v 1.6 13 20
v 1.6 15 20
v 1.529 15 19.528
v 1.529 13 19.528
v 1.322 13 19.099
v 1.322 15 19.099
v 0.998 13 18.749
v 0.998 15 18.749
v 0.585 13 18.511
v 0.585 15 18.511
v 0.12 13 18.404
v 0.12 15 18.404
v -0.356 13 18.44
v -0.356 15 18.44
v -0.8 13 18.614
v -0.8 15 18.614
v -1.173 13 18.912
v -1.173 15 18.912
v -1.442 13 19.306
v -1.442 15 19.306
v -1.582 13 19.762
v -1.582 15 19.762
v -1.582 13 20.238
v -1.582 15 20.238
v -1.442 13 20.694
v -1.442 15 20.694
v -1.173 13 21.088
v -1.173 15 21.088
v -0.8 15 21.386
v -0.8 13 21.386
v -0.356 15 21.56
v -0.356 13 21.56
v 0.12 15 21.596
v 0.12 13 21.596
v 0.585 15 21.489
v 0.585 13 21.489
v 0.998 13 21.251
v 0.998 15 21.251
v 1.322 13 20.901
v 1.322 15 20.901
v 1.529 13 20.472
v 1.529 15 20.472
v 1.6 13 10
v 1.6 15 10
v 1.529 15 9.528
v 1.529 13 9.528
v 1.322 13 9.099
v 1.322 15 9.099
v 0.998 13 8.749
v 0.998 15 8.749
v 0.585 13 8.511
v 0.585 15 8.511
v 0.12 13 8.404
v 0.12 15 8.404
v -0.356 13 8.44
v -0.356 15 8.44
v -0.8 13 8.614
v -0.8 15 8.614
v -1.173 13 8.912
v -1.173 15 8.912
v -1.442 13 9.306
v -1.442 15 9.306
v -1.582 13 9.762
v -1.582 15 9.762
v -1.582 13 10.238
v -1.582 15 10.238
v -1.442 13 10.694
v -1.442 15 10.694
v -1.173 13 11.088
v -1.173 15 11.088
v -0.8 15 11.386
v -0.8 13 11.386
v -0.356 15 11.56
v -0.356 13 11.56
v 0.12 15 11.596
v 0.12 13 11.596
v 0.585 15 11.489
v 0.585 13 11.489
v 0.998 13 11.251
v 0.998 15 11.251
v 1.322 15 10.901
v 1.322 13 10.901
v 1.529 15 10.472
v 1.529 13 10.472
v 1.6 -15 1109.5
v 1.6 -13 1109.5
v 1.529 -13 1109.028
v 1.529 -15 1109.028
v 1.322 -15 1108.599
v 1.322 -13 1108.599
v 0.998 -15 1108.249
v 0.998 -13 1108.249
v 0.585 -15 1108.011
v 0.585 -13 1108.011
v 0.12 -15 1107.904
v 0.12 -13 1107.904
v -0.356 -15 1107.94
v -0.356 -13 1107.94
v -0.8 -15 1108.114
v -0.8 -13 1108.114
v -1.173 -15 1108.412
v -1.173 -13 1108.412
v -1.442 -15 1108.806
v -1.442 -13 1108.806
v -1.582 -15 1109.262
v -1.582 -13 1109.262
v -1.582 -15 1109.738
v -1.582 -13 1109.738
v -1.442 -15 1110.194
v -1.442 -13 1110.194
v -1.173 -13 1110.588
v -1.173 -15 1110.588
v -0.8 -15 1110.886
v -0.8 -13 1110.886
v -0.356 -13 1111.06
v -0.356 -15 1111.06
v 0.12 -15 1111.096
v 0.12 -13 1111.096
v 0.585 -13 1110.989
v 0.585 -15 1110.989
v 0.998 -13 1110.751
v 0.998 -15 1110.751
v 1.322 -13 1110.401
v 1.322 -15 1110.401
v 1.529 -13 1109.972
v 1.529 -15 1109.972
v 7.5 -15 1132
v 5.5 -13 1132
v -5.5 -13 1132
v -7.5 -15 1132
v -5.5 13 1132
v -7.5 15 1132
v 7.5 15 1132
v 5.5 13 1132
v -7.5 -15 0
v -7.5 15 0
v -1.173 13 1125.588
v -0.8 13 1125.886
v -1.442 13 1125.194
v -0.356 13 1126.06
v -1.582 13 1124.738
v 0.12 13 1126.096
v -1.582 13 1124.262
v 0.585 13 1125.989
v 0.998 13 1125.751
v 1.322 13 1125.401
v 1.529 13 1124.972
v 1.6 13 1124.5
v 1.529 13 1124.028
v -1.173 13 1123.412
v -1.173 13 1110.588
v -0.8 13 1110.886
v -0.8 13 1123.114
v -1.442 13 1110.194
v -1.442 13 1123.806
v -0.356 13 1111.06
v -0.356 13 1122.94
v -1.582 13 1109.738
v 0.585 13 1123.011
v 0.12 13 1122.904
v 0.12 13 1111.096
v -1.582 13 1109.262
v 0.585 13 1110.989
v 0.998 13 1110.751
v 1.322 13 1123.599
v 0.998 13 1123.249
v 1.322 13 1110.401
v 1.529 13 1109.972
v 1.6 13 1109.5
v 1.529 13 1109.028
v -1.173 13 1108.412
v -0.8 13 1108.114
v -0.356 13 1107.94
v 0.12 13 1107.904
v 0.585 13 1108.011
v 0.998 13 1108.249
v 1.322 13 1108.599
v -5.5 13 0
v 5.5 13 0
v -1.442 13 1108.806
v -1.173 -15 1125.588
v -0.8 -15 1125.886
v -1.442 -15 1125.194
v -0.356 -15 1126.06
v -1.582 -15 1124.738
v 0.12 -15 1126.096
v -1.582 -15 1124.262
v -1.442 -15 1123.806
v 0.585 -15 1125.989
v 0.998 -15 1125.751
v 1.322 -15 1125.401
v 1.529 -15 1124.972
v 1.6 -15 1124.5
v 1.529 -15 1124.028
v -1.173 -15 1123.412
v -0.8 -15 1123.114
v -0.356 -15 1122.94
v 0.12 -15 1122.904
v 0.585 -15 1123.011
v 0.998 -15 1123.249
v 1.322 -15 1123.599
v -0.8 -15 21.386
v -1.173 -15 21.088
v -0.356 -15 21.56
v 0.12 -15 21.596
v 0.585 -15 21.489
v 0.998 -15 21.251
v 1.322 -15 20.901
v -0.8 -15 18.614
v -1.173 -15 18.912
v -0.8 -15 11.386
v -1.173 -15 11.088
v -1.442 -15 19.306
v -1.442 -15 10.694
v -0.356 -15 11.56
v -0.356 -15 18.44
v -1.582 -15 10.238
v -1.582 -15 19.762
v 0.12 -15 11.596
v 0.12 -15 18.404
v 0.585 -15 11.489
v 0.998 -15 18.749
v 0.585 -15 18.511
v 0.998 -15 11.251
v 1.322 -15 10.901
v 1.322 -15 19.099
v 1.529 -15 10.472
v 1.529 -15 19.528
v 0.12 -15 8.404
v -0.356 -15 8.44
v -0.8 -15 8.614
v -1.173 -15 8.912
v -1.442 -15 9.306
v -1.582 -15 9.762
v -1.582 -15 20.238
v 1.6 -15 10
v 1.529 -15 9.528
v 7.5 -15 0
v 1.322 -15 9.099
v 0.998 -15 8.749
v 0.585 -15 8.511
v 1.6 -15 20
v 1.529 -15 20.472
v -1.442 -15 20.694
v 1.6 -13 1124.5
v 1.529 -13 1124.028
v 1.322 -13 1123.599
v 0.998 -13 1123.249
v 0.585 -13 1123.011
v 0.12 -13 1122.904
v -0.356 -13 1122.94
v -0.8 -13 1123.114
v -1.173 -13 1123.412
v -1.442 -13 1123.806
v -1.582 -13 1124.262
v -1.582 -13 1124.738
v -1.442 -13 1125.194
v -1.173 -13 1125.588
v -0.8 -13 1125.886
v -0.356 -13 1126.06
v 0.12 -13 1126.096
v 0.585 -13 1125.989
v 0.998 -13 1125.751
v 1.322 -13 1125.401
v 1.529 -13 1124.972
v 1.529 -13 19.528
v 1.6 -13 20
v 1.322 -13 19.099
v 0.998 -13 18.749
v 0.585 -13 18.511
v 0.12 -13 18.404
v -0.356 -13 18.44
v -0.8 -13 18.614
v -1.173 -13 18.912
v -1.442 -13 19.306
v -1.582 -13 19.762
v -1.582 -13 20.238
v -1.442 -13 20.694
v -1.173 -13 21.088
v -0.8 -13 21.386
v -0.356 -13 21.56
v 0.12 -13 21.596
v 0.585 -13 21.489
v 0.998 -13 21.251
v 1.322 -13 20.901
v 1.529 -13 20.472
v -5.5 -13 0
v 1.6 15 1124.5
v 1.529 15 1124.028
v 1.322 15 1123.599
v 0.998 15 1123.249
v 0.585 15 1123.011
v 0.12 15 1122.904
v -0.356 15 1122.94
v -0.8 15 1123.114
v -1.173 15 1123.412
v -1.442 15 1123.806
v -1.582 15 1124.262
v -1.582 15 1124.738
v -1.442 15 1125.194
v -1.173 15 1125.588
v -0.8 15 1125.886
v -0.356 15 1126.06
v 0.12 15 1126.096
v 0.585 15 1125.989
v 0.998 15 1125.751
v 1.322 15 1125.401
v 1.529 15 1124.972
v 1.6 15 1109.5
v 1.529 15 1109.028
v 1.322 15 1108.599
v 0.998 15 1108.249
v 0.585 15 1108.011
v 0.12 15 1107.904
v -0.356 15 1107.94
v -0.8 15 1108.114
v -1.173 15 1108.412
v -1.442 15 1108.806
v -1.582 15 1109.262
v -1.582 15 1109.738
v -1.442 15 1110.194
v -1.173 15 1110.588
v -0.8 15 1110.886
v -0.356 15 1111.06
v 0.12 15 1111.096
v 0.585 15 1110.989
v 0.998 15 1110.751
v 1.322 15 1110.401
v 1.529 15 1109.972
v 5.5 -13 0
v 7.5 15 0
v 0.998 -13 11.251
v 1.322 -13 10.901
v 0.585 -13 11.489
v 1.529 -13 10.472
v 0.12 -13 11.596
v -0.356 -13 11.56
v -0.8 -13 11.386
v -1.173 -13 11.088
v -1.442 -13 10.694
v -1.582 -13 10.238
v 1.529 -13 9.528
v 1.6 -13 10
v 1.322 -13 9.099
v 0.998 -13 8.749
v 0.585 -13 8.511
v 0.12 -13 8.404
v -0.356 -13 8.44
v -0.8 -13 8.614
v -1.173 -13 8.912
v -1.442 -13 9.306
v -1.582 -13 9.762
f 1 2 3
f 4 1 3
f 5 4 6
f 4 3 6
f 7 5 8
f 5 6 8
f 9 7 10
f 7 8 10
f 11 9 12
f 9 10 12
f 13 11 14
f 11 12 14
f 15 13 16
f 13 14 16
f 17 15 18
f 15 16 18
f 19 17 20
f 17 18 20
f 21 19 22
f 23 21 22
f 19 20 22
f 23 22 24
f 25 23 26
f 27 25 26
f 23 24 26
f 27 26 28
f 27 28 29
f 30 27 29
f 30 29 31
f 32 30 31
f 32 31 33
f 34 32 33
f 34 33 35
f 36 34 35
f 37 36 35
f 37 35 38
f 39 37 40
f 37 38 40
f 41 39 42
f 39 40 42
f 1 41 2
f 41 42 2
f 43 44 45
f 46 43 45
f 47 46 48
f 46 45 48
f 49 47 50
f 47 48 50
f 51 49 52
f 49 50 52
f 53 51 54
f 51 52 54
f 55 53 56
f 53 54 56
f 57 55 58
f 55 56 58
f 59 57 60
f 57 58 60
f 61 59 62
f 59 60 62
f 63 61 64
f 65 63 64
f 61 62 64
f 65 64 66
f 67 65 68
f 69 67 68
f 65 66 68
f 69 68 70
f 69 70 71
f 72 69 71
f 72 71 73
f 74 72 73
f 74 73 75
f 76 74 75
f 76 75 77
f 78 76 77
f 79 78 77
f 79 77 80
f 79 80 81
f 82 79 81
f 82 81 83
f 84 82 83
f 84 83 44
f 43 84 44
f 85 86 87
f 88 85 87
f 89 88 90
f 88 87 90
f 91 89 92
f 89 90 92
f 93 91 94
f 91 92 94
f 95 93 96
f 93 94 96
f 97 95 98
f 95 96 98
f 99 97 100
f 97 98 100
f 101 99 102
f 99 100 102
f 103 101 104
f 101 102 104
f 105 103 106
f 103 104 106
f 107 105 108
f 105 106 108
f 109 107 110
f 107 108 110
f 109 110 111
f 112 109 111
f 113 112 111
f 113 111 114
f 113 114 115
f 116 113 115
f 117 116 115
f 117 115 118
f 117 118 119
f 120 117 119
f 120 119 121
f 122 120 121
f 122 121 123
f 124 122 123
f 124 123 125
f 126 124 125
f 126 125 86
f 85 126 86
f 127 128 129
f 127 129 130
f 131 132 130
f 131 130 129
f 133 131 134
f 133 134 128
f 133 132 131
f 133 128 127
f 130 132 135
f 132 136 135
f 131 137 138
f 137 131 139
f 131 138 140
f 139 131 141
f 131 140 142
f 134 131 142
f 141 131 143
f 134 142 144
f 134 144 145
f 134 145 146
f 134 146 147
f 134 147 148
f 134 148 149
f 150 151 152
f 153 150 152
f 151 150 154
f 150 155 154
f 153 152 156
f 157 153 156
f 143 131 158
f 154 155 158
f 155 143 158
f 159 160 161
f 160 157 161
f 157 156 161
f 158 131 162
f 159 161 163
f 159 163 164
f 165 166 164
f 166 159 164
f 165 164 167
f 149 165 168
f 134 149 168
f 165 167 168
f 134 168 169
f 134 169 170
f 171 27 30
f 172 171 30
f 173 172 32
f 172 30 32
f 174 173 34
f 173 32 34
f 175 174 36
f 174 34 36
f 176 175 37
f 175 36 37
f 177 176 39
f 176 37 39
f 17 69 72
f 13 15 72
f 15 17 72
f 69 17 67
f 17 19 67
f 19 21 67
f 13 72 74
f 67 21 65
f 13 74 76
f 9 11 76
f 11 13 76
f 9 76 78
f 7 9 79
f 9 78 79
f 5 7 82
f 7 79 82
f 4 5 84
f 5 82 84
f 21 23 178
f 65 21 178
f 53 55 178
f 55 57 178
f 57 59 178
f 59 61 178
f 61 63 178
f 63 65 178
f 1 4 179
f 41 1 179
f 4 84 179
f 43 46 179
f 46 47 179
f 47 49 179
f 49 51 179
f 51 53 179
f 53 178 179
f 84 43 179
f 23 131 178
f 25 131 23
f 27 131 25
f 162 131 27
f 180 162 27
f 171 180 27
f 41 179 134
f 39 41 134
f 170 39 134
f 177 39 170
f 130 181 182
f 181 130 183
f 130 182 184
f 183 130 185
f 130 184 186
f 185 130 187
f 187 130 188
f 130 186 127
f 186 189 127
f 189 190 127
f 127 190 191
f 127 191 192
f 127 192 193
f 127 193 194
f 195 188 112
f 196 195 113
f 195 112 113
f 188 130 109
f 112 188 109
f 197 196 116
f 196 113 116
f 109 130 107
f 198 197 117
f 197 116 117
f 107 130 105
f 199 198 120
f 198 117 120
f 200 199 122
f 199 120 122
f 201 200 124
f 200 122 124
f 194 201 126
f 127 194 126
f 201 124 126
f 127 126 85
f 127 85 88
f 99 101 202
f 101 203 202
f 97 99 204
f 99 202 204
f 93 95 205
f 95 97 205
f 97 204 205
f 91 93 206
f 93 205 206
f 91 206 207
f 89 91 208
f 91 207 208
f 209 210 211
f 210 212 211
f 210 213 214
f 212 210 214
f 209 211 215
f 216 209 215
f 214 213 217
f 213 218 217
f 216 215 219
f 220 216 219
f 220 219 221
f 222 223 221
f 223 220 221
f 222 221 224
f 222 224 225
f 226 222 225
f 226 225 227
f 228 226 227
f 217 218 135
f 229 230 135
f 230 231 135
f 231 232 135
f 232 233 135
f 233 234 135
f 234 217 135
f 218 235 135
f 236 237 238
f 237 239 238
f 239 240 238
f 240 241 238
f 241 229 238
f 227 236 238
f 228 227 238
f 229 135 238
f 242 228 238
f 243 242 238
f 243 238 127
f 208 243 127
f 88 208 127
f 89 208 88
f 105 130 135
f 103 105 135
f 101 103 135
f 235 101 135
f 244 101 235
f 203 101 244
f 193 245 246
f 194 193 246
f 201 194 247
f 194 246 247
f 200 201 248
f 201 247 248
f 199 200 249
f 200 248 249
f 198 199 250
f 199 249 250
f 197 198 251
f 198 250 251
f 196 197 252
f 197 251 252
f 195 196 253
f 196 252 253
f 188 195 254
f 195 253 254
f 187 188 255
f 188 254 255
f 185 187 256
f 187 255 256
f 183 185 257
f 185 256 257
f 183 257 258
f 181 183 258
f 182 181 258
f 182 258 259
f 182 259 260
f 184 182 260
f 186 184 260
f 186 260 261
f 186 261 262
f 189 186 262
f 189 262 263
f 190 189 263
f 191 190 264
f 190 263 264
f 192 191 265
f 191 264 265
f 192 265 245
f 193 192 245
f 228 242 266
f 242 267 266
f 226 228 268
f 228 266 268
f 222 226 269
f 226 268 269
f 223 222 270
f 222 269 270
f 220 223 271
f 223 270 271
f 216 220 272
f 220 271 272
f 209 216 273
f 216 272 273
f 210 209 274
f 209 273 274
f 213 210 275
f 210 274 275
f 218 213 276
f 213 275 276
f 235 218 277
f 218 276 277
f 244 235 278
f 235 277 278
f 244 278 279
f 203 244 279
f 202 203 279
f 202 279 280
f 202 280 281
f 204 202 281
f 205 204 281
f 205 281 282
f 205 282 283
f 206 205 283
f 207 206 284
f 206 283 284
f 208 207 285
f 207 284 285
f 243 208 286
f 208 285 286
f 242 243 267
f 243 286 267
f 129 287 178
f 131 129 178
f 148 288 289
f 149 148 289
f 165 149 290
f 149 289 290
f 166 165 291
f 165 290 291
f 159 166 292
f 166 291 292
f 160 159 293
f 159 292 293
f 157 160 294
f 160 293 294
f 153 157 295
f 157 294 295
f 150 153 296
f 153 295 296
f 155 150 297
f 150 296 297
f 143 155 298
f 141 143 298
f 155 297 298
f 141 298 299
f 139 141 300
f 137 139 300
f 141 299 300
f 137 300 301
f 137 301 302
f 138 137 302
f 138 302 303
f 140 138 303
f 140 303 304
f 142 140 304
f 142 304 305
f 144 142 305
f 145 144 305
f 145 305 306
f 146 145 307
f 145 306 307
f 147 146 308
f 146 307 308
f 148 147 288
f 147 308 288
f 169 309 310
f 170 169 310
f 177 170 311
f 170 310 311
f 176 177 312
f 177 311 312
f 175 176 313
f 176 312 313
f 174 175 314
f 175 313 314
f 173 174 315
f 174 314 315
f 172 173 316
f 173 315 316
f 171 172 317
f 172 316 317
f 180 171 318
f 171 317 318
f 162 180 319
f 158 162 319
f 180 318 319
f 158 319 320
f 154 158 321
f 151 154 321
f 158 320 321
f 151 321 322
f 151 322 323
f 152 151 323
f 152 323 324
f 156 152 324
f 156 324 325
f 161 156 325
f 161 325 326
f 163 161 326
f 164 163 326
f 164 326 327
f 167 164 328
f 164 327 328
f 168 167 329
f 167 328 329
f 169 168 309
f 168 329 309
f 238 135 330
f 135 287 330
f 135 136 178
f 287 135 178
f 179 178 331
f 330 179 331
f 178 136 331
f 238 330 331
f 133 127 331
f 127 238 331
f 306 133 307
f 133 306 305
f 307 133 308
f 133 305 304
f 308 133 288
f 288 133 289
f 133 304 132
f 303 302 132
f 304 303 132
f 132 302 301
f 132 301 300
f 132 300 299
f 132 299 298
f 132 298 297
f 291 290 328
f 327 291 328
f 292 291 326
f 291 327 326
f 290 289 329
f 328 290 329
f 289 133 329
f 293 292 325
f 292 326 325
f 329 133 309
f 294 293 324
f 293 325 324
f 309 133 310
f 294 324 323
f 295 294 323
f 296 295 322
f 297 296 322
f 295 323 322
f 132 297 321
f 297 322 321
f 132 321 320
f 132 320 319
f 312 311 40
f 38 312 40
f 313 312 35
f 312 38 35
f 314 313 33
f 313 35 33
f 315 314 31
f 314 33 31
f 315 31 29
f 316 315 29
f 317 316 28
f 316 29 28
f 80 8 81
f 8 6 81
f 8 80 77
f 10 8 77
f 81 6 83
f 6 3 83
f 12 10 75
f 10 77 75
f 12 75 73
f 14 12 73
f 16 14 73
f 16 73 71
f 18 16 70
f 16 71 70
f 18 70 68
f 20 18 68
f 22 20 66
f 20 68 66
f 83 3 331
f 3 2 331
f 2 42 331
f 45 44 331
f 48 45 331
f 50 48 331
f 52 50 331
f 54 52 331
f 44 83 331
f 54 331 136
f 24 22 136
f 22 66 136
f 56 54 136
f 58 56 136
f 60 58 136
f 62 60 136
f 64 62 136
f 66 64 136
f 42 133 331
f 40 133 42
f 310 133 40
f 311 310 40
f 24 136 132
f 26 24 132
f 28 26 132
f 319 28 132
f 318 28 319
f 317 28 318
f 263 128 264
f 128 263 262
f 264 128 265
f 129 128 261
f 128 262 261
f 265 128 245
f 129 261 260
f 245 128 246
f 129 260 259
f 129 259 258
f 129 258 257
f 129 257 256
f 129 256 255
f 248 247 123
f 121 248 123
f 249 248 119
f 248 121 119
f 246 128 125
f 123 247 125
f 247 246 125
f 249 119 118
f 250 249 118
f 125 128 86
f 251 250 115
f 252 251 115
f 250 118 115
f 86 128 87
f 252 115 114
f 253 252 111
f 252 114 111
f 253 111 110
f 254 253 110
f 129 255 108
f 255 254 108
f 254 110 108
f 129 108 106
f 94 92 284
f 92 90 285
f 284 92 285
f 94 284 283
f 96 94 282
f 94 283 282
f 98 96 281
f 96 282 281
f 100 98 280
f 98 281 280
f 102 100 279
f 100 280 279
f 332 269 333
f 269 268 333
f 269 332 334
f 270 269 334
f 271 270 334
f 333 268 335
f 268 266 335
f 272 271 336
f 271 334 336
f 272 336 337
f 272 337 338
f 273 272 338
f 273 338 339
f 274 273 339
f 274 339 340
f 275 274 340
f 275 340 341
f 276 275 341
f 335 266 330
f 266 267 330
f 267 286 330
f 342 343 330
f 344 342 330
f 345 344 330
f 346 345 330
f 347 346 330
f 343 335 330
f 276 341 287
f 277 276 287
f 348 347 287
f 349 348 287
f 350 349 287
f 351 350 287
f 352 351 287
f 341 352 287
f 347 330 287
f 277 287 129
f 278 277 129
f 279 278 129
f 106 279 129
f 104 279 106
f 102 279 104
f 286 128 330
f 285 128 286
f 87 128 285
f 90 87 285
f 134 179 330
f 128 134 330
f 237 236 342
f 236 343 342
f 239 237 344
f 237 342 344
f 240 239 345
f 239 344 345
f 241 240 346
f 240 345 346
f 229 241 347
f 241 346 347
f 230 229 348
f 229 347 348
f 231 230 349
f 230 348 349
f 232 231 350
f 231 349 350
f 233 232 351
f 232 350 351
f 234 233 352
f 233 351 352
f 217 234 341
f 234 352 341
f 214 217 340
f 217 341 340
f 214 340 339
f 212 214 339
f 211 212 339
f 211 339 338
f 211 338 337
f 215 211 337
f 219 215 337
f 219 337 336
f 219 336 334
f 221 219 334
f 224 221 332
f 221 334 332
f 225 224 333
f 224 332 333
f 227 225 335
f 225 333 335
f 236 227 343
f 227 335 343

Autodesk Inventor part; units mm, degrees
ref_plane "YZ Plane" through (0, 0, 0) normal (1, 0, 0) x (0, 1, 0)
ref_plane "XZ Plane" through (0, 0, 0) normal (0, 1, 0) x (-1, 0, 0)
ref_plane "XY Plane" through (0, 0, 0) normal (0, 0, 1) x (1, 0, 0)
sketch "スケッチ1" plane through (0, 0, 0) normal (0, 0, 1) x (1, 0, 0)
  line L0 (7.5, 15) -> (-7.5, 15)
  line L1 (-7.5, 15) -> (-7.5, -15)
  line L2 (-7.5, -15) -> (7.5, -15)
  line L3 (7.5, -15) -> (7.5, 15)
  line L4 (7.5, 15) -> (-7.5, -15) construction
  line L5 (-7.5, 15) -> (7.5, -15) construction
  line L6 (-5.5, 13) -> (5.5, 13)
  line L7 (5.5, 13) -> (5.5, -13)
  line L8 (5.5, -13) -> (-5.5, -13)
  line L9 (-5.5, -13) -> (-5.5, 13)
  point P0 (0, 0)
  dimension "d0" = 15
  dimension "d1" = 30
  dimension "d2" = 2
extrude "押し出し1" add sketch "スケッチ1" along normal blind 1132
sketch "スケッチ2" plane through (-7.5, 15, 1132) normal (0, 1, 0) x (1, 0, 0)
  circle A0 centre (7.5, 1122) radius 1.6
  circle A1 centre (7.5, 1112) radius 1.6
  line L0 (15, 1132) -> (0, 1132) projected
  circle A2 centre (7.5, 7.5) radius 1.6
  circle A3 centre (7.5, 22.5) radius 1.6
  line L1 (15, 0) -> (0, 0) projected
  point P0 (7.5, 1132)
  point P1 (7.5, 1132)
  point P2 (7.5, 0)
  dimension "d5" = 3.2
  dimension "d6" = 3.2
  dimension "d7" = 10
  dimension "d8" = 10
  dimension "d9" = 3.2
  dimension "d10" = 3.2
  dimension "d11" = 15
  dimension "d12" = 7.5
extrude "押し出し2" cut sketch "スケッチ2" against normal through all
properties part number "上昇機構_角柱1" material "アルミニウム 6061"
